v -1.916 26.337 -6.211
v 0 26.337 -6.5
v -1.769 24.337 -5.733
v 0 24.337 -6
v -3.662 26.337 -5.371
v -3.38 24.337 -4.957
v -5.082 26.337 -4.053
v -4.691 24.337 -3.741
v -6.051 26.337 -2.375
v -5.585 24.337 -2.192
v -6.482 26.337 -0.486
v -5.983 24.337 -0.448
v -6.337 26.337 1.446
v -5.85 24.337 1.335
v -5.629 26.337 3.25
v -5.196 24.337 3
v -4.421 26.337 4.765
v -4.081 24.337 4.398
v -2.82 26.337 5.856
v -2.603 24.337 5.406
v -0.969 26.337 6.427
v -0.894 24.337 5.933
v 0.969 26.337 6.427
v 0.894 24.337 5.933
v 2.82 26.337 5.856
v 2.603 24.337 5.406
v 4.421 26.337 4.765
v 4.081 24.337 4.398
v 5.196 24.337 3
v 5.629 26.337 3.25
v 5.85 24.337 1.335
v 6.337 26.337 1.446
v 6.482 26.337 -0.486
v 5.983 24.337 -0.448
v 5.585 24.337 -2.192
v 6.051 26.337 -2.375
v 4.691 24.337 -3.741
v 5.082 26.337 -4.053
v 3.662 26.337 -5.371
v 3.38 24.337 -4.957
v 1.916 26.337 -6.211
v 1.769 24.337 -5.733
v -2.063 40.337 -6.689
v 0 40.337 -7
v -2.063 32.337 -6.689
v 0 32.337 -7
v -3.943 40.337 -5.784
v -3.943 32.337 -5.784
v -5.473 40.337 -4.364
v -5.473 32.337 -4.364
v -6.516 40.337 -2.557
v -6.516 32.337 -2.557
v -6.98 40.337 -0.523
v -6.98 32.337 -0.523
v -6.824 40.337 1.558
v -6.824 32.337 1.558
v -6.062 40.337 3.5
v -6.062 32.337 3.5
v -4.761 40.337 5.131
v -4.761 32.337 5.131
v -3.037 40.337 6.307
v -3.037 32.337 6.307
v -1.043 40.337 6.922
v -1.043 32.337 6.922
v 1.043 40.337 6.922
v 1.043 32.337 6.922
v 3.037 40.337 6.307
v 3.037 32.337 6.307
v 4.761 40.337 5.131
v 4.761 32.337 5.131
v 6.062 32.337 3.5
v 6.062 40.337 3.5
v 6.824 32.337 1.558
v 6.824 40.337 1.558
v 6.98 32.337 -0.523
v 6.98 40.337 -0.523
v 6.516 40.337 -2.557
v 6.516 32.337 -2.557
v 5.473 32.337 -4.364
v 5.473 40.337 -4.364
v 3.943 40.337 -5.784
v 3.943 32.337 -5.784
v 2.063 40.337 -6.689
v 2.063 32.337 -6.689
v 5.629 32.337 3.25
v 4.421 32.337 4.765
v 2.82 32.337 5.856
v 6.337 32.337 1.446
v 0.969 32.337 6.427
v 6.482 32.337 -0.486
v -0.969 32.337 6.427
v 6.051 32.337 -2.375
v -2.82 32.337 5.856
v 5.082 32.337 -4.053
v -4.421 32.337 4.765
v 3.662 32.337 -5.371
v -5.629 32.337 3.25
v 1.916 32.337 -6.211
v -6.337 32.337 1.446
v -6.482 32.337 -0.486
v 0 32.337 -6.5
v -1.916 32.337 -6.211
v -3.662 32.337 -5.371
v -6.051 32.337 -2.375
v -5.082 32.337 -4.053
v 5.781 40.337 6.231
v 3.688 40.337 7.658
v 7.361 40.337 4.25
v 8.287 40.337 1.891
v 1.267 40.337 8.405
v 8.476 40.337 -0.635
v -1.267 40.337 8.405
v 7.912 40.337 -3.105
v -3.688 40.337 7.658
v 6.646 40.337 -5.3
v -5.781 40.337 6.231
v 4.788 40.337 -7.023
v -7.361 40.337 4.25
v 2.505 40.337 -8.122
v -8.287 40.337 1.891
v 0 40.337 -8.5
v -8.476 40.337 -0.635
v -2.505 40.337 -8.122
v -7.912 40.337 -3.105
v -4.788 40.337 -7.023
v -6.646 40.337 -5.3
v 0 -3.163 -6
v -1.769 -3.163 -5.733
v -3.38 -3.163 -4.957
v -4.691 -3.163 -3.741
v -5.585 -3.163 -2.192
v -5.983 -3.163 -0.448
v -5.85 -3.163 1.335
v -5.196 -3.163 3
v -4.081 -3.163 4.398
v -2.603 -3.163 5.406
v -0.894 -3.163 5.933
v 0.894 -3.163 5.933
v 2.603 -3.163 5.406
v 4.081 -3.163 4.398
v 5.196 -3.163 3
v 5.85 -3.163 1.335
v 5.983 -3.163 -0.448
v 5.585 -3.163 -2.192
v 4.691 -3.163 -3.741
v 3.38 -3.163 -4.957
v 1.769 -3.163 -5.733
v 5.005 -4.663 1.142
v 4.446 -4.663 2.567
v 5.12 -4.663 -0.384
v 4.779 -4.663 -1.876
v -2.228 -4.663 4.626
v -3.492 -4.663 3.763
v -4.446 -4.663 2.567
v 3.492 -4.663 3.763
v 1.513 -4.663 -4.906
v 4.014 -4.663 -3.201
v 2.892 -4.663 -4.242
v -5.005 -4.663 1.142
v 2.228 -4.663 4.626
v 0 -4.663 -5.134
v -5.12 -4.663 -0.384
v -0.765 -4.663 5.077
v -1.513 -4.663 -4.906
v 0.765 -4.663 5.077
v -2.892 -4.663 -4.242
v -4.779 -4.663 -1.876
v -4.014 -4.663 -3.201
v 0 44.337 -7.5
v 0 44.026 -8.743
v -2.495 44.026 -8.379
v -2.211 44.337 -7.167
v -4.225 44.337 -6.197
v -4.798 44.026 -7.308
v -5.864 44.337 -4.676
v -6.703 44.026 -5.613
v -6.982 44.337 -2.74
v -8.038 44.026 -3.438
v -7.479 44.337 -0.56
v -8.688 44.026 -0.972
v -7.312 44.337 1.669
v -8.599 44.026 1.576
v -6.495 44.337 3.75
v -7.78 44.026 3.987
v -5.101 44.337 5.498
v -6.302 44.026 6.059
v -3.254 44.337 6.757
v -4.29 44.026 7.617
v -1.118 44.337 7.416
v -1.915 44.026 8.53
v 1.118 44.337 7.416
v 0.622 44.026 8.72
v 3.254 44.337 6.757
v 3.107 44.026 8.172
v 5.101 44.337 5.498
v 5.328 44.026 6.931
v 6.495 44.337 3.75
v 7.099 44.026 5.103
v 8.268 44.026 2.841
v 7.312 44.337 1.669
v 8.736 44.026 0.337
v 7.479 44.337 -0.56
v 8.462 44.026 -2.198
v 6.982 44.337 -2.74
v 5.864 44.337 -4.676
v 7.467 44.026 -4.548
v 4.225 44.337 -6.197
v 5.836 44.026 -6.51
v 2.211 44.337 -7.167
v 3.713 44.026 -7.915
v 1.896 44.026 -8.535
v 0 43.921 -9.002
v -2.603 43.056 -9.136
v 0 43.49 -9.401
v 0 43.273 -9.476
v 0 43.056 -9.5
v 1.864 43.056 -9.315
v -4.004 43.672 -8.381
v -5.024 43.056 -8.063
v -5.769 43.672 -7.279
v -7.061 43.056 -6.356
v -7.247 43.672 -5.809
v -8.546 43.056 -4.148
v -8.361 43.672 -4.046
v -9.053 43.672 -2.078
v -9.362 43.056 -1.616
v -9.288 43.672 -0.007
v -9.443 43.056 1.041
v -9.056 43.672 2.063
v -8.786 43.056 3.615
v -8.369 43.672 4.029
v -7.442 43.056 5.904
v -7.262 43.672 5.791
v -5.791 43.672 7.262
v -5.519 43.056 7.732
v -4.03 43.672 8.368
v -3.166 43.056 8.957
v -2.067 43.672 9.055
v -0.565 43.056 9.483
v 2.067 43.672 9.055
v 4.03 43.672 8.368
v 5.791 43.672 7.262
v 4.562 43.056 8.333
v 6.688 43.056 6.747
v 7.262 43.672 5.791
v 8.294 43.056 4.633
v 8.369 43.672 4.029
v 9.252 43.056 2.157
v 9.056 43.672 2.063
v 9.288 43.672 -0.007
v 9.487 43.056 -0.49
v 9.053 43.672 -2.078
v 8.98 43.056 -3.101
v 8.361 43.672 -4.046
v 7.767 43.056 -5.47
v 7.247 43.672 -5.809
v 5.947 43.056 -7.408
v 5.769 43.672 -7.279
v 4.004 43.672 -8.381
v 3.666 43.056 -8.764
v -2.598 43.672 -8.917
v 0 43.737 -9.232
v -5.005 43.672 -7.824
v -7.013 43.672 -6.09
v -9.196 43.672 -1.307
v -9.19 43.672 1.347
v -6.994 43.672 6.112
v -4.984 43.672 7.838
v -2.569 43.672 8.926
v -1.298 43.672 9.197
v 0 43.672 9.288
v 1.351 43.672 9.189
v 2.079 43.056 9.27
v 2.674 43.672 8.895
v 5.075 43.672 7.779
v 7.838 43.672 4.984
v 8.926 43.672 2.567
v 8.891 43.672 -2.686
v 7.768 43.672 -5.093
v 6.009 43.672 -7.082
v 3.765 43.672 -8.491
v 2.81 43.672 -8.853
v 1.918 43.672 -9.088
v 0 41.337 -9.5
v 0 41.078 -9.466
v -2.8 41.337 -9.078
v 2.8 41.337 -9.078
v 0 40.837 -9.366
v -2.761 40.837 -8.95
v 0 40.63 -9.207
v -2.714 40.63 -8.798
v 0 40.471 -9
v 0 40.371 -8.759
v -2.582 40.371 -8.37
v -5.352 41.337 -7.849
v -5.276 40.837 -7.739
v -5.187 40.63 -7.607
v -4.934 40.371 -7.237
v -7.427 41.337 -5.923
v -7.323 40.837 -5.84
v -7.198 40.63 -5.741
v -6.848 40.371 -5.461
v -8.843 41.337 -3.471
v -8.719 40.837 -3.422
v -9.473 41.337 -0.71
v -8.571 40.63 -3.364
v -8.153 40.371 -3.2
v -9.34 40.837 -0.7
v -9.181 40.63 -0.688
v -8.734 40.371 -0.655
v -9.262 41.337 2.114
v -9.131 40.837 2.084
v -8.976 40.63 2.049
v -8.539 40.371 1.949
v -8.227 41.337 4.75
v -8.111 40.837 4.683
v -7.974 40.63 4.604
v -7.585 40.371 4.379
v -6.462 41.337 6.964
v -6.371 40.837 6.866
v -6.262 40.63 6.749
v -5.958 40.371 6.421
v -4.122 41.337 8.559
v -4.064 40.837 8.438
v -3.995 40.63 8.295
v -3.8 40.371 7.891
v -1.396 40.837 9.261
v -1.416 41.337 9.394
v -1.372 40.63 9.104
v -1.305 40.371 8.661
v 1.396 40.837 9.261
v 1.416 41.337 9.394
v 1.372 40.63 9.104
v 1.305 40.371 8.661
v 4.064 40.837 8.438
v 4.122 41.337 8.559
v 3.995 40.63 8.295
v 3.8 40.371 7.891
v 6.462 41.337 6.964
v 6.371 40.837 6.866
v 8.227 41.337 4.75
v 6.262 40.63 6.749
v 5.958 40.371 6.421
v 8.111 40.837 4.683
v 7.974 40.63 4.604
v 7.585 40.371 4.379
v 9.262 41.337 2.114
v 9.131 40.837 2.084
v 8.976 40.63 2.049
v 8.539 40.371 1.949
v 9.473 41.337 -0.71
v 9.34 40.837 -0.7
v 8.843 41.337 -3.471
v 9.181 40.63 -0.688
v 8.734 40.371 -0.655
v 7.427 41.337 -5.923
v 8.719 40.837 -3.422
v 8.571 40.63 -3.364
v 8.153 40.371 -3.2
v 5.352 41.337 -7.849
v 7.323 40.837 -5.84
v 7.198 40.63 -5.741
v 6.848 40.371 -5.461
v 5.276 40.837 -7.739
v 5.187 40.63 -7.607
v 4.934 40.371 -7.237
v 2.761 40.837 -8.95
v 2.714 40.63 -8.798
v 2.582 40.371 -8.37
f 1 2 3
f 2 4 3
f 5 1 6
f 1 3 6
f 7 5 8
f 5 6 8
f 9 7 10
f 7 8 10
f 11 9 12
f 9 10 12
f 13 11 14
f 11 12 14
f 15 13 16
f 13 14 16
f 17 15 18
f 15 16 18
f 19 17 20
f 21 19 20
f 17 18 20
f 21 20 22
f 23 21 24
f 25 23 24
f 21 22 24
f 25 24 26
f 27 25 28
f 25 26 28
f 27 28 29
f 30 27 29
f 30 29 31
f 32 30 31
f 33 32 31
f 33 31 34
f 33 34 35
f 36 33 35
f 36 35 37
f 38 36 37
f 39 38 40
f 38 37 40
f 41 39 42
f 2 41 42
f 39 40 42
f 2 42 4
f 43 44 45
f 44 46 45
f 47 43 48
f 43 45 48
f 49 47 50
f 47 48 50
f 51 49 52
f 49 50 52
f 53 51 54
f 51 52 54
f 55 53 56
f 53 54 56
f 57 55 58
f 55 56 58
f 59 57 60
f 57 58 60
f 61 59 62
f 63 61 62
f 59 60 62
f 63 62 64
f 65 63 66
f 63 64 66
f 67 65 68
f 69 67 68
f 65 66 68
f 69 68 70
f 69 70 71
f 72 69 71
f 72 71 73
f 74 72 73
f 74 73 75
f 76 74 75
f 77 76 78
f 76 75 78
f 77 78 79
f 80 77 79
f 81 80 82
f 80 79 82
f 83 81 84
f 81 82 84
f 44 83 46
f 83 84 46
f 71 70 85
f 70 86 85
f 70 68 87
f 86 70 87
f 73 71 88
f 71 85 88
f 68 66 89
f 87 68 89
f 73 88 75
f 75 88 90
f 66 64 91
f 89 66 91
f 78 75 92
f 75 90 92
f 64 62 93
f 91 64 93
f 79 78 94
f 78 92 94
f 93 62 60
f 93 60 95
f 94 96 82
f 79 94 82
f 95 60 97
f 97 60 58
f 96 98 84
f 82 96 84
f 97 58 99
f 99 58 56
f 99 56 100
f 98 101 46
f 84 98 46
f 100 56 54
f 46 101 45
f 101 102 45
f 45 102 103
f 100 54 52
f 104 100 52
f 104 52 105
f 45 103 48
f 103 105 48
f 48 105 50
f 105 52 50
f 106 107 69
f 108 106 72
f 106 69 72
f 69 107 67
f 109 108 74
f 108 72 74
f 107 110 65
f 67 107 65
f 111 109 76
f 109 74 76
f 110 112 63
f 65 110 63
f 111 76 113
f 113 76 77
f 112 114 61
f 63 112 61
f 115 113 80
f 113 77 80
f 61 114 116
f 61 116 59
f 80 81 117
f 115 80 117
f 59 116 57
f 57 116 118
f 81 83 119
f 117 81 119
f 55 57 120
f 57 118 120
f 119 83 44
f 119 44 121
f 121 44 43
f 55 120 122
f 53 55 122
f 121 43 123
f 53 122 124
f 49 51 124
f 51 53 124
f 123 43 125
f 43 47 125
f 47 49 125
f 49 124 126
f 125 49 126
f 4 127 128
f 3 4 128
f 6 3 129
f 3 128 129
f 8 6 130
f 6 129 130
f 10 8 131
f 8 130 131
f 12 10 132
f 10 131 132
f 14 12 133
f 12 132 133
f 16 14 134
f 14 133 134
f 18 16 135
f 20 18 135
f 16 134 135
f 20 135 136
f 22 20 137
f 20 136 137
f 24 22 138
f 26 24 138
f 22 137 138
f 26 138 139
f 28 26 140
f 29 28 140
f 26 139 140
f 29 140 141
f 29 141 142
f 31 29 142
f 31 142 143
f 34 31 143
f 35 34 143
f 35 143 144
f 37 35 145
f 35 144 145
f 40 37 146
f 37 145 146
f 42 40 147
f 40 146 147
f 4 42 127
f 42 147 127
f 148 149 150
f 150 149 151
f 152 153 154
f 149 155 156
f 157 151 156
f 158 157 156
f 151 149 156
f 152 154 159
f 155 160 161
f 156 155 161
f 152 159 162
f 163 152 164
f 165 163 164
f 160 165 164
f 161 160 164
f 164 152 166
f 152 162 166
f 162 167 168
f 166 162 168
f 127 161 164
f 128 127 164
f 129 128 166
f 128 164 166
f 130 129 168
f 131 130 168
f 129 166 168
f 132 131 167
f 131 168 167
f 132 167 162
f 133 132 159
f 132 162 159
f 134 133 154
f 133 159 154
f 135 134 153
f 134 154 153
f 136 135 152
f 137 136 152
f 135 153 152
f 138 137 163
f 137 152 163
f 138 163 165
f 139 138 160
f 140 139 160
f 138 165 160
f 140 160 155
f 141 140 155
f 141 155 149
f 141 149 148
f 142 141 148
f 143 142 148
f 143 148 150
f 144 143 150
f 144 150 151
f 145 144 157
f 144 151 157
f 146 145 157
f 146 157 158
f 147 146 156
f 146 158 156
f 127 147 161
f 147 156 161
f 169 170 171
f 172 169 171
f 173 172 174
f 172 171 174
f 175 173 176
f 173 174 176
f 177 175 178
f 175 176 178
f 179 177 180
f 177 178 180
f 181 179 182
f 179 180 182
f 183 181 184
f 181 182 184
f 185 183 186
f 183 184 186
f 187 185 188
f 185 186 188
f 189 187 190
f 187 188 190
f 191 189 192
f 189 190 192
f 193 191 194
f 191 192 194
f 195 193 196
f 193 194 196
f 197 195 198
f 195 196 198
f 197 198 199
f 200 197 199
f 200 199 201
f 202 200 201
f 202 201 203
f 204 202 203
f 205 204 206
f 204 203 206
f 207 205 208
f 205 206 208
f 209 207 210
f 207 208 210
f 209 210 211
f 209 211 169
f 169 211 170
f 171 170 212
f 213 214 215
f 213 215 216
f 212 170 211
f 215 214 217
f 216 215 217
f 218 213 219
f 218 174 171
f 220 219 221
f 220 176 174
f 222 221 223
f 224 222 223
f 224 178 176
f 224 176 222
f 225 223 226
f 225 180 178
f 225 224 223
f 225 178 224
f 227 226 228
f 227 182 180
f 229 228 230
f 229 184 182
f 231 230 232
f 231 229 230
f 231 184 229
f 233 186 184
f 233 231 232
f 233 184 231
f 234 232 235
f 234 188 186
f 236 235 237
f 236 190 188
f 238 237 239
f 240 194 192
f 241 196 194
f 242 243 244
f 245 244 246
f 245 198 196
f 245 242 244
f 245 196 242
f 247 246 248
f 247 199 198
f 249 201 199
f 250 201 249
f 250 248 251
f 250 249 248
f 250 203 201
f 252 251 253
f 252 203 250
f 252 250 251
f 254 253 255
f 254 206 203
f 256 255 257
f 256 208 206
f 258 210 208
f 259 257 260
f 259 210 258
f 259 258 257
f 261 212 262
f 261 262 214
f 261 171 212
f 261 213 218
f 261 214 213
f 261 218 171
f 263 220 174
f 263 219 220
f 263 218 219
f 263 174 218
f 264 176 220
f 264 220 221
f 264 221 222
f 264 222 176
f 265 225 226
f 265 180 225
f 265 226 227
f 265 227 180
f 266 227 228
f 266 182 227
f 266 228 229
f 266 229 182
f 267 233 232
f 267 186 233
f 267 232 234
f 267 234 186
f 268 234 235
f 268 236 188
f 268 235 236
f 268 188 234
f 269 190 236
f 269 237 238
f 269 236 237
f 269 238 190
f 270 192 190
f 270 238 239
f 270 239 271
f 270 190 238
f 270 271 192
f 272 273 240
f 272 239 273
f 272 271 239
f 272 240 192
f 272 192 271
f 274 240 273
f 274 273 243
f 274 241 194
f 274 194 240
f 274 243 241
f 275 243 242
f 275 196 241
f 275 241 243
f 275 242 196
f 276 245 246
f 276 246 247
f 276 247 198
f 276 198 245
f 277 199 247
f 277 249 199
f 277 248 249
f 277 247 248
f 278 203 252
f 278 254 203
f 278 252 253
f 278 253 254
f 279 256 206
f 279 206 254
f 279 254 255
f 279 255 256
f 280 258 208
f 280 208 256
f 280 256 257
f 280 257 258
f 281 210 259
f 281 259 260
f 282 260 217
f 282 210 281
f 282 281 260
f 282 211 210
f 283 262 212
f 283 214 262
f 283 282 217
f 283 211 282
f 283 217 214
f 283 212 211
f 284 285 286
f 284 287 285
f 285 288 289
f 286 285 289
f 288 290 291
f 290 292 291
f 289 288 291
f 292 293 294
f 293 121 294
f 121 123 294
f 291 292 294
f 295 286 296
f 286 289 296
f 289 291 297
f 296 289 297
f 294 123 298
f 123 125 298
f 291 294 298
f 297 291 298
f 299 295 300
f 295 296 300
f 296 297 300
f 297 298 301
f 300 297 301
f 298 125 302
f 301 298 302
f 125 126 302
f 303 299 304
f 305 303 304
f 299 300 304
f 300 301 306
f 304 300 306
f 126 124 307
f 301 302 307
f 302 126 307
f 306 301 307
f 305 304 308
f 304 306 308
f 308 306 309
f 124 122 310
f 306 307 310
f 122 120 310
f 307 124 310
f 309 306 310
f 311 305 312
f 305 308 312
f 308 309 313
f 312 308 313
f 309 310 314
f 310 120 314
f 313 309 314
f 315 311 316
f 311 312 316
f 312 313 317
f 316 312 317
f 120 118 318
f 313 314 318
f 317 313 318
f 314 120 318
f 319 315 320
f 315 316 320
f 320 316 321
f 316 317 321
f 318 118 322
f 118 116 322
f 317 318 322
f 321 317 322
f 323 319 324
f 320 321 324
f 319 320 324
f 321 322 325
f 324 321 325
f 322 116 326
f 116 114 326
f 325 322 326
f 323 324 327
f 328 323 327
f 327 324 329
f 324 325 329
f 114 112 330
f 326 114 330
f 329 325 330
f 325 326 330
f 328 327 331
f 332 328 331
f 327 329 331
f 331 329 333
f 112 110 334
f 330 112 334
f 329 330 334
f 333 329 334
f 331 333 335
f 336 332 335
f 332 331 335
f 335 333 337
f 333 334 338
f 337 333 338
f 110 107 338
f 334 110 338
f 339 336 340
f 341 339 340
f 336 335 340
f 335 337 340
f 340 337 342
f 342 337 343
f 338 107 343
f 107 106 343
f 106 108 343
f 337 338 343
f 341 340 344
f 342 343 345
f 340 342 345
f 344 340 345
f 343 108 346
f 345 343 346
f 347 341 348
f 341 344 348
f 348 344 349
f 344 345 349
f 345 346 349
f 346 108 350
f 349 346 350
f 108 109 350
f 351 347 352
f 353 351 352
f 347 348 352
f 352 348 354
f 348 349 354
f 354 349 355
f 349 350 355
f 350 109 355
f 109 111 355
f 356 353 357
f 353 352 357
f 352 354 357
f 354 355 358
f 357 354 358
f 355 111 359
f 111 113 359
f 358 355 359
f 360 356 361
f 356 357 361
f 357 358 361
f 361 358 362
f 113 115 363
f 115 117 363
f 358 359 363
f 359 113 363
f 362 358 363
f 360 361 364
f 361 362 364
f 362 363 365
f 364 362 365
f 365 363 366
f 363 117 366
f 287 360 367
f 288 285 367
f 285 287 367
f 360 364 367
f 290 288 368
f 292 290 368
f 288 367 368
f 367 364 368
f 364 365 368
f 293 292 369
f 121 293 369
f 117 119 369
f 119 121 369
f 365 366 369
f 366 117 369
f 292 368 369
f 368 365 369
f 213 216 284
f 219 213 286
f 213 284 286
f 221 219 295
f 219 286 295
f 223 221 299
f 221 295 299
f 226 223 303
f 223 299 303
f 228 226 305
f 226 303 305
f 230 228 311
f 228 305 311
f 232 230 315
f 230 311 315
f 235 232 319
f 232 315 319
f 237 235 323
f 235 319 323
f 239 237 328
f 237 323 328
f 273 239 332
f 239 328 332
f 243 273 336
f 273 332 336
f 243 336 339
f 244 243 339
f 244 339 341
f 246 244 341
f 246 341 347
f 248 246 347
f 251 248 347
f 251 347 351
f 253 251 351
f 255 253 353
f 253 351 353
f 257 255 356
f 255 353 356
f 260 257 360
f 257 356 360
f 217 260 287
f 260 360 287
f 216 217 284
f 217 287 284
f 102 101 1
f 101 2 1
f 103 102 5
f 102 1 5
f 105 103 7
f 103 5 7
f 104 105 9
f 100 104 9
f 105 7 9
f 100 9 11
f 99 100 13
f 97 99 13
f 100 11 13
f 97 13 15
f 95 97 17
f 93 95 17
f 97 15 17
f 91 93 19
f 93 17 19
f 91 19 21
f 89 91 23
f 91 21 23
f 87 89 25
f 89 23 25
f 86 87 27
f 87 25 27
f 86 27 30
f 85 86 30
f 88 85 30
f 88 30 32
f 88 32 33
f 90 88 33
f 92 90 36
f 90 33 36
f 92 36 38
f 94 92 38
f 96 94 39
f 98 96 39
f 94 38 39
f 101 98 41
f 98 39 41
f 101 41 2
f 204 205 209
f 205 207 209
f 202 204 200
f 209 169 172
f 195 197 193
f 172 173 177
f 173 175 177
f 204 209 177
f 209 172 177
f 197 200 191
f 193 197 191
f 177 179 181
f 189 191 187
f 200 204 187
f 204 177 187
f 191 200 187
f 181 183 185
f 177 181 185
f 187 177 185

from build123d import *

# Parameters (mm, degrees)
FILETE1_R      = 1
FILETE2_R      = 1
CHANFRO1_SIZE  = 1.5
CHANFRO1_SIZE2 = 0.866025404


with BuildPart() as part:
    # Esboço1 → Revolução1 (revolve)
    with BuildSketch(Plane.XY, mode=Mode.PRIVATE) as revolu_o1_sk:
        Polygon((0, 44.337029737), (7.5, 44.337029737), (9.5, 43.837029737), (9.5, 40.337029737), (7, 40.337029737), (7, 32.337029737), (6.5, 32.337029737), (6.5, 26.337029737), (6, 24.337029737), (6, -4.662970263), (0, -4.662970263), align=None)
    revolve(revolu_o1_sk.sketch.rotate(Axis((0, -66.826190476, 0), (0, 1, 0)), 90), axis=Axis((0, -66.826190476, 0), (0, 1, 0)))

    # Filete1
    filete1_edges = [part.edges().sort_by_distance(p)[0] for p in [
        (0, 43.837029737, 9.5),
    ]]
    fillet(filete1_edges, radius=FILETE1_R)

    # Filete2
    filete2_edges = [part.edges().sort_by_distance(p)[0] for p in [
        (0, 40.337029737, 9.5),
    ]]
    fillet(filete2_edges, radius=FILETE2_R)

    # Chanfro1
    chanfro1_edges = [part.edges().sort_by_distance(p)[0] for p in [
        (0, -4.662970263, 6),
    ]]
    chanfro1_side = [part.faces().sort_by_distance(p)[0] for p in [
        (0, 9.837029737, 6),
    ]]
    chamfer(chanfro1_edges, length=CHANFRO1_SIZE, length2=CHANFRO1_SIZE2, reference=chanfro1_side[0])


solid = part.part
